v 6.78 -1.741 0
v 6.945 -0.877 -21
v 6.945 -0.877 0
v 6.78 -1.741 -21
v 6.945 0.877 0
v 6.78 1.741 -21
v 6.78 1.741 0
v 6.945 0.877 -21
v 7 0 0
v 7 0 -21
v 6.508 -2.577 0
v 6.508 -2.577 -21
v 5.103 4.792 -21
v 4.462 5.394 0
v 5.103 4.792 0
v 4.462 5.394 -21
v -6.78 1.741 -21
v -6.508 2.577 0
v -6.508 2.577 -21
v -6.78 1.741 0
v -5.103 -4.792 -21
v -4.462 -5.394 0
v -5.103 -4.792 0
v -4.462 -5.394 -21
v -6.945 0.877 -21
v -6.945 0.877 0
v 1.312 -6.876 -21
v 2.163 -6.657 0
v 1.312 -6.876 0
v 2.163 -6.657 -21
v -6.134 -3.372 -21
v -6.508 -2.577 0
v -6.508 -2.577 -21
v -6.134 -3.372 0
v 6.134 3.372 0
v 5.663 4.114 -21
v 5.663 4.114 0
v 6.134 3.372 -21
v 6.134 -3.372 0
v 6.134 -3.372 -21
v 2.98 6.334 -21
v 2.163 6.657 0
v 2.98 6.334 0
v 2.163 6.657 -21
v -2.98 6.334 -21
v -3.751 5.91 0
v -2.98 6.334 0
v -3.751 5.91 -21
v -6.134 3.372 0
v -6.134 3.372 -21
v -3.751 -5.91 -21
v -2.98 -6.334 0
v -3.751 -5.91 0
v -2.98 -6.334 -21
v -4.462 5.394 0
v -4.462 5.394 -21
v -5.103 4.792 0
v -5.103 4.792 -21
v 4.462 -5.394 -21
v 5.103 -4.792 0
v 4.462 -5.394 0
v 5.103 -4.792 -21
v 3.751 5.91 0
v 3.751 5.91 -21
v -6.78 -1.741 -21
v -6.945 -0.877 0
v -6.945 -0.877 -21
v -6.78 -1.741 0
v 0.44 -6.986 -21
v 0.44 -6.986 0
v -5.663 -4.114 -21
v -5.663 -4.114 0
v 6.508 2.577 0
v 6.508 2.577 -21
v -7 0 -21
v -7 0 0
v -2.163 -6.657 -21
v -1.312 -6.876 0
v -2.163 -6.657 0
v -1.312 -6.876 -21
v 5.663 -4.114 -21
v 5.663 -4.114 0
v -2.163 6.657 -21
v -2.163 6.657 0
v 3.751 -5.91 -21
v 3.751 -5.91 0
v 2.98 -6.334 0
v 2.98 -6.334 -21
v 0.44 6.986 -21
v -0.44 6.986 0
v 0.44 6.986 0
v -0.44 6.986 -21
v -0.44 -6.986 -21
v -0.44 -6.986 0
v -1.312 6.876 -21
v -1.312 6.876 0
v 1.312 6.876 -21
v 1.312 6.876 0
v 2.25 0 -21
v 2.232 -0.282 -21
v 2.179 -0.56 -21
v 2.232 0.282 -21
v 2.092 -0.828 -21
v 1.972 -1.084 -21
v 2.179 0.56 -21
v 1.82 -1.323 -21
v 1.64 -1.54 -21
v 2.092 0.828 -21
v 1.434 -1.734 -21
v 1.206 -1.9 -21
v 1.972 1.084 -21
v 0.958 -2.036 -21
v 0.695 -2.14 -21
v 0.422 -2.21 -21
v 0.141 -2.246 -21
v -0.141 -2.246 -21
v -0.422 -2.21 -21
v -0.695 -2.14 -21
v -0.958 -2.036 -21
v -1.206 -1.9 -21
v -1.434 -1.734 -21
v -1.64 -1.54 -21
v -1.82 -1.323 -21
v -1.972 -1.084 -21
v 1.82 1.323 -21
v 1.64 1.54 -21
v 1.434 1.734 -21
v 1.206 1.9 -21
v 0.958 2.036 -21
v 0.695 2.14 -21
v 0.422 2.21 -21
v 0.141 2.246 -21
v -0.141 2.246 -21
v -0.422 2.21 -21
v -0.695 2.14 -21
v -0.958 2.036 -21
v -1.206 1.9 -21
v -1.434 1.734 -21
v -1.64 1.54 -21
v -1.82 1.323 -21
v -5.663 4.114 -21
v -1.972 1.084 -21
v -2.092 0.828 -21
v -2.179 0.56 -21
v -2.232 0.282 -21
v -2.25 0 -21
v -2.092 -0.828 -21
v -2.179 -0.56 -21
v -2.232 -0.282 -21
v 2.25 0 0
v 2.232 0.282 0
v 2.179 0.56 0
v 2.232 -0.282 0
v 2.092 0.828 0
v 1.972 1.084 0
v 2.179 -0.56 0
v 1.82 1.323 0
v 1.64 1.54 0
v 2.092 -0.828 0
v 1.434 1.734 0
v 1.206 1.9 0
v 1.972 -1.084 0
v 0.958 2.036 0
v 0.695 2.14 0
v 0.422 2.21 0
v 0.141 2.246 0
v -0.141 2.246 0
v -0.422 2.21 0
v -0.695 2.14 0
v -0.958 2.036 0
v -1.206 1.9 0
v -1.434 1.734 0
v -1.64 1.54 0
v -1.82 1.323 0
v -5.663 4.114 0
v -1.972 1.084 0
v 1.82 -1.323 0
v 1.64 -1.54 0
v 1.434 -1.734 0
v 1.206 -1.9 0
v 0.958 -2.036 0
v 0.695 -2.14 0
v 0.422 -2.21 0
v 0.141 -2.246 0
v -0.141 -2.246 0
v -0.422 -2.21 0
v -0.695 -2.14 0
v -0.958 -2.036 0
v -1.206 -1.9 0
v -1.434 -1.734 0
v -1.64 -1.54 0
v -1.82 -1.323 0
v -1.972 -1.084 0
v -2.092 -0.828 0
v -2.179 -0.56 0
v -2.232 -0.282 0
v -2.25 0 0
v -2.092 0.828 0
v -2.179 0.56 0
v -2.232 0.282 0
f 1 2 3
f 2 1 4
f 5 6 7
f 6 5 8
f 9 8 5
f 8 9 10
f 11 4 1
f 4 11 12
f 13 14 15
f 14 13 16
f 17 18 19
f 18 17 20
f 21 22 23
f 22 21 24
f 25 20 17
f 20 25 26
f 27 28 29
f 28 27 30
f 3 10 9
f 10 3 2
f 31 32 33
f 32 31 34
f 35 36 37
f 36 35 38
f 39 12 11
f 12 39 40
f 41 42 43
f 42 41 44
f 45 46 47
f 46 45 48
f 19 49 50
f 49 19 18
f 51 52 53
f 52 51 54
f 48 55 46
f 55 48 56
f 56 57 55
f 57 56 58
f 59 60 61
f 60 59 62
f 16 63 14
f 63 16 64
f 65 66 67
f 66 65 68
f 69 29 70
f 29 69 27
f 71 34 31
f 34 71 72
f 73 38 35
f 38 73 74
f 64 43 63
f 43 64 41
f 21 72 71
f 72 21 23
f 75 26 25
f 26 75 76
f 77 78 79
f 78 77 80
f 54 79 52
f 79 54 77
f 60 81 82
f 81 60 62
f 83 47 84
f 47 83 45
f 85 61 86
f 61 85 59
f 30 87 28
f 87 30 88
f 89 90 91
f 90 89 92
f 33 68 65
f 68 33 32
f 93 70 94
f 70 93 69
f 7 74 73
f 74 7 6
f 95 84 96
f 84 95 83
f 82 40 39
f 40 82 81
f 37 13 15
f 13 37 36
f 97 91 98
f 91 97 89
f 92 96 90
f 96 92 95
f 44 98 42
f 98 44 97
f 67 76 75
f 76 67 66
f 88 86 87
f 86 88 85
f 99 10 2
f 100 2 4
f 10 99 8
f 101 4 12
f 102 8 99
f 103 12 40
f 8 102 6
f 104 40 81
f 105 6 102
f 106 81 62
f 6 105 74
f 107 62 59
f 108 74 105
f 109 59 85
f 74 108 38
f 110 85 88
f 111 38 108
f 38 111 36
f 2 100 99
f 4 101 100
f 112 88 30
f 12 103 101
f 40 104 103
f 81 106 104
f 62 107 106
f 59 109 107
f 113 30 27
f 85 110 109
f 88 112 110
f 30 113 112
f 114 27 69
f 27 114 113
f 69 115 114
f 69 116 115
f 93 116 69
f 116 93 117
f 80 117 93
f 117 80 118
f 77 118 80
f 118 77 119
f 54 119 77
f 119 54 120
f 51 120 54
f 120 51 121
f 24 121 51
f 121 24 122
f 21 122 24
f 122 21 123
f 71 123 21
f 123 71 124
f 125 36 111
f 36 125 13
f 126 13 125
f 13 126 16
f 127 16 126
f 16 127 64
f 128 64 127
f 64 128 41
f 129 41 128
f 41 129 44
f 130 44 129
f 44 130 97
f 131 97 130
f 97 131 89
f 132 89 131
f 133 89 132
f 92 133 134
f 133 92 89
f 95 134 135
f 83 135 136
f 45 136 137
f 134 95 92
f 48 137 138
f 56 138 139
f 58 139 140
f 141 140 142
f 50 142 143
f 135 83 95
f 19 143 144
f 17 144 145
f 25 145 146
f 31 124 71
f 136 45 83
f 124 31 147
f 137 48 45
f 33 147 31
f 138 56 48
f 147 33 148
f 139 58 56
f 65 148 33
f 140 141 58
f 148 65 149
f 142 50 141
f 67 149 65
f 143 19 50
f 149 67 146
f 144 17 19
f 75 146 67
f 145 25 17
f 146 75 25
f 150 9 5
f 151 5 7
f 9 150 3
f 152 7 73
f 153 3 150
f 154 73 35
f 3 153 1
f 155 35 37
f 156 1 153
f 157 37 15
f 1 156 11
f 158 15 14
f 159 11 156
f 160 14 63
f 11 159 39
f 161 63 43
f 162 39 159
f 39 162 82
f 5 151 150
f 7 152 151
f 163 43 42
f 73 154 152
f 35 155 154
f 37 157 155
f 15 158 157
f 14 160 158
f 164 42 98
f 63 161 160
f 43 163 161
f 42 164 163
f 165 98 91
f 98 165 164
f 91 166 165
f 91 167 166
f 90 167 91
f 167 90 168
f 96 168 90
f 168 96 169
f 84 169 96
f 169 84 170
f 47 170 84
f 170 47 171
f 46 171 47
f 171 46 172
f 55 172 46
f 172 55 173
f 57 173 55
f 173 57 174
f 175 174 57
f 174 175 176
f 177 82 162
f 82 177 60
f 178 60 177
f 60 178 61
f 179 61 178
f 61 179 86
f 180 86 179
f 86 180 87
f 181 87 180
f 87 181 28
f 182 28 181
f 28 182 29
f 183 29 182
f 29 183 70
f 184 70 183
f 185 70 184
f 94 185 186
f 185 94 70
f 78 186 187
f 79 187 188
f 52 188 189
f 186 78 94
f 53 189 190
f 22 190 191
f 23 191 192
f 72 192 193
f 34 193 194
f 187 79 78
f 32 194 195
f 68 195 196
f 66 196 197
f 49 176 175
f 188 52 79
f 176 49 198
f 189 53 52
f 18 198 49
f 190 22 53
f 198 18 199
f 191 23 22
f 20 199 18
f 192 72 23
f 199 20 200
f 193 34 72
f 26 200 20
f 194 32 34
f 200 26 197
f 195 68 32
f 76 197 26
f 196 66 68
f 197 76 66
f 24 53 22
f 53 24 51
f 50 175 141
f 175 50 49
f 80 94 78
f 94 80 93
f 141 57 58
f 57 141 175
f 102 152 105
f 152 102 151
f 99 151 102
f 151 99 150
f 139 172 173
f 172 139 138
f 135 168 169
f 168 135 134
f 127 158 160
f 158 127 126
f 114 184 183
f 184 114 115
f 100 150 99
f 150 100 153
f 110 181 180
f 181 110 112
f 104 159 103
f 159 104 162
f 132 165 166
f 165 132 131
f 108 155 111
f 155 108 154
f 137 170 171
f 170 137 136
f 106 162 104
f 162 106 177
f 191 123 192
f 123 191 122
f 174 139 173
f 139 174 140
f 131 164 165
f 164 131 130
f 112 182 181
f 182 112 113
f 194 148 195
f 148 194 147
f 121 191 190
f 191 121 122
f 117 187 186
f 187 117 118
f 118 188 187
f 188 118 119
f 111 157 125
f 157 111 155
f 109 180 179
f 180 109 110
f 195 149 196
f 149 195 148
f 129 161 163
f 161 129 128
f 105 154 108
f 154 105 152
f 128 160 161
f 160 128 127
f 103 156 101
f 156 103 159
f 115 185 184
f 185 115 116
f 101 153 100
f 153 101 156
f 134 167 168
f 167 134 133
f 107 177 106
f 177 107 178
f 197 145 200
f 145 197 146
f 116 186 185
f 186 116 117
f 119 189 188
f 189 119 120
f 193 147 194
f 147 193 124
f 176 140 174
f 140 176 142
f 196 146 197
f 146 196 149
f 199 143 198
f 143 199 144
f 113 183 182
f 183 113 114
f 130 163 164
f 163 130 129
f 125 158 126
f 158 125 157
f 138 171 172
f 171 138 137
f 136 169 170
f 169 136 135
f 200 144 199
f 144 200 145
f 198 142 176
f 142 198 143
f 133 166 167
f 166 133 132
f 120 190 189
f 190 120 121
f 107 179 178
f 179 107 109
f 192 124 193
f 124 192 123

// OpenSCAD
$fn = 50;


difference() {
	union() {
		translate(v = [0, 0, -21.0000000000]) {
			cylinder(h = 21, r = 7.0000000000);
		}
		cylinder(h = 0, r = 10.0000000000);
	}
	union() {
		#translate(v = [0, 0, -21]) {
			cylinder(h = 21, r = 2.2500000000);
		}
	}
}
